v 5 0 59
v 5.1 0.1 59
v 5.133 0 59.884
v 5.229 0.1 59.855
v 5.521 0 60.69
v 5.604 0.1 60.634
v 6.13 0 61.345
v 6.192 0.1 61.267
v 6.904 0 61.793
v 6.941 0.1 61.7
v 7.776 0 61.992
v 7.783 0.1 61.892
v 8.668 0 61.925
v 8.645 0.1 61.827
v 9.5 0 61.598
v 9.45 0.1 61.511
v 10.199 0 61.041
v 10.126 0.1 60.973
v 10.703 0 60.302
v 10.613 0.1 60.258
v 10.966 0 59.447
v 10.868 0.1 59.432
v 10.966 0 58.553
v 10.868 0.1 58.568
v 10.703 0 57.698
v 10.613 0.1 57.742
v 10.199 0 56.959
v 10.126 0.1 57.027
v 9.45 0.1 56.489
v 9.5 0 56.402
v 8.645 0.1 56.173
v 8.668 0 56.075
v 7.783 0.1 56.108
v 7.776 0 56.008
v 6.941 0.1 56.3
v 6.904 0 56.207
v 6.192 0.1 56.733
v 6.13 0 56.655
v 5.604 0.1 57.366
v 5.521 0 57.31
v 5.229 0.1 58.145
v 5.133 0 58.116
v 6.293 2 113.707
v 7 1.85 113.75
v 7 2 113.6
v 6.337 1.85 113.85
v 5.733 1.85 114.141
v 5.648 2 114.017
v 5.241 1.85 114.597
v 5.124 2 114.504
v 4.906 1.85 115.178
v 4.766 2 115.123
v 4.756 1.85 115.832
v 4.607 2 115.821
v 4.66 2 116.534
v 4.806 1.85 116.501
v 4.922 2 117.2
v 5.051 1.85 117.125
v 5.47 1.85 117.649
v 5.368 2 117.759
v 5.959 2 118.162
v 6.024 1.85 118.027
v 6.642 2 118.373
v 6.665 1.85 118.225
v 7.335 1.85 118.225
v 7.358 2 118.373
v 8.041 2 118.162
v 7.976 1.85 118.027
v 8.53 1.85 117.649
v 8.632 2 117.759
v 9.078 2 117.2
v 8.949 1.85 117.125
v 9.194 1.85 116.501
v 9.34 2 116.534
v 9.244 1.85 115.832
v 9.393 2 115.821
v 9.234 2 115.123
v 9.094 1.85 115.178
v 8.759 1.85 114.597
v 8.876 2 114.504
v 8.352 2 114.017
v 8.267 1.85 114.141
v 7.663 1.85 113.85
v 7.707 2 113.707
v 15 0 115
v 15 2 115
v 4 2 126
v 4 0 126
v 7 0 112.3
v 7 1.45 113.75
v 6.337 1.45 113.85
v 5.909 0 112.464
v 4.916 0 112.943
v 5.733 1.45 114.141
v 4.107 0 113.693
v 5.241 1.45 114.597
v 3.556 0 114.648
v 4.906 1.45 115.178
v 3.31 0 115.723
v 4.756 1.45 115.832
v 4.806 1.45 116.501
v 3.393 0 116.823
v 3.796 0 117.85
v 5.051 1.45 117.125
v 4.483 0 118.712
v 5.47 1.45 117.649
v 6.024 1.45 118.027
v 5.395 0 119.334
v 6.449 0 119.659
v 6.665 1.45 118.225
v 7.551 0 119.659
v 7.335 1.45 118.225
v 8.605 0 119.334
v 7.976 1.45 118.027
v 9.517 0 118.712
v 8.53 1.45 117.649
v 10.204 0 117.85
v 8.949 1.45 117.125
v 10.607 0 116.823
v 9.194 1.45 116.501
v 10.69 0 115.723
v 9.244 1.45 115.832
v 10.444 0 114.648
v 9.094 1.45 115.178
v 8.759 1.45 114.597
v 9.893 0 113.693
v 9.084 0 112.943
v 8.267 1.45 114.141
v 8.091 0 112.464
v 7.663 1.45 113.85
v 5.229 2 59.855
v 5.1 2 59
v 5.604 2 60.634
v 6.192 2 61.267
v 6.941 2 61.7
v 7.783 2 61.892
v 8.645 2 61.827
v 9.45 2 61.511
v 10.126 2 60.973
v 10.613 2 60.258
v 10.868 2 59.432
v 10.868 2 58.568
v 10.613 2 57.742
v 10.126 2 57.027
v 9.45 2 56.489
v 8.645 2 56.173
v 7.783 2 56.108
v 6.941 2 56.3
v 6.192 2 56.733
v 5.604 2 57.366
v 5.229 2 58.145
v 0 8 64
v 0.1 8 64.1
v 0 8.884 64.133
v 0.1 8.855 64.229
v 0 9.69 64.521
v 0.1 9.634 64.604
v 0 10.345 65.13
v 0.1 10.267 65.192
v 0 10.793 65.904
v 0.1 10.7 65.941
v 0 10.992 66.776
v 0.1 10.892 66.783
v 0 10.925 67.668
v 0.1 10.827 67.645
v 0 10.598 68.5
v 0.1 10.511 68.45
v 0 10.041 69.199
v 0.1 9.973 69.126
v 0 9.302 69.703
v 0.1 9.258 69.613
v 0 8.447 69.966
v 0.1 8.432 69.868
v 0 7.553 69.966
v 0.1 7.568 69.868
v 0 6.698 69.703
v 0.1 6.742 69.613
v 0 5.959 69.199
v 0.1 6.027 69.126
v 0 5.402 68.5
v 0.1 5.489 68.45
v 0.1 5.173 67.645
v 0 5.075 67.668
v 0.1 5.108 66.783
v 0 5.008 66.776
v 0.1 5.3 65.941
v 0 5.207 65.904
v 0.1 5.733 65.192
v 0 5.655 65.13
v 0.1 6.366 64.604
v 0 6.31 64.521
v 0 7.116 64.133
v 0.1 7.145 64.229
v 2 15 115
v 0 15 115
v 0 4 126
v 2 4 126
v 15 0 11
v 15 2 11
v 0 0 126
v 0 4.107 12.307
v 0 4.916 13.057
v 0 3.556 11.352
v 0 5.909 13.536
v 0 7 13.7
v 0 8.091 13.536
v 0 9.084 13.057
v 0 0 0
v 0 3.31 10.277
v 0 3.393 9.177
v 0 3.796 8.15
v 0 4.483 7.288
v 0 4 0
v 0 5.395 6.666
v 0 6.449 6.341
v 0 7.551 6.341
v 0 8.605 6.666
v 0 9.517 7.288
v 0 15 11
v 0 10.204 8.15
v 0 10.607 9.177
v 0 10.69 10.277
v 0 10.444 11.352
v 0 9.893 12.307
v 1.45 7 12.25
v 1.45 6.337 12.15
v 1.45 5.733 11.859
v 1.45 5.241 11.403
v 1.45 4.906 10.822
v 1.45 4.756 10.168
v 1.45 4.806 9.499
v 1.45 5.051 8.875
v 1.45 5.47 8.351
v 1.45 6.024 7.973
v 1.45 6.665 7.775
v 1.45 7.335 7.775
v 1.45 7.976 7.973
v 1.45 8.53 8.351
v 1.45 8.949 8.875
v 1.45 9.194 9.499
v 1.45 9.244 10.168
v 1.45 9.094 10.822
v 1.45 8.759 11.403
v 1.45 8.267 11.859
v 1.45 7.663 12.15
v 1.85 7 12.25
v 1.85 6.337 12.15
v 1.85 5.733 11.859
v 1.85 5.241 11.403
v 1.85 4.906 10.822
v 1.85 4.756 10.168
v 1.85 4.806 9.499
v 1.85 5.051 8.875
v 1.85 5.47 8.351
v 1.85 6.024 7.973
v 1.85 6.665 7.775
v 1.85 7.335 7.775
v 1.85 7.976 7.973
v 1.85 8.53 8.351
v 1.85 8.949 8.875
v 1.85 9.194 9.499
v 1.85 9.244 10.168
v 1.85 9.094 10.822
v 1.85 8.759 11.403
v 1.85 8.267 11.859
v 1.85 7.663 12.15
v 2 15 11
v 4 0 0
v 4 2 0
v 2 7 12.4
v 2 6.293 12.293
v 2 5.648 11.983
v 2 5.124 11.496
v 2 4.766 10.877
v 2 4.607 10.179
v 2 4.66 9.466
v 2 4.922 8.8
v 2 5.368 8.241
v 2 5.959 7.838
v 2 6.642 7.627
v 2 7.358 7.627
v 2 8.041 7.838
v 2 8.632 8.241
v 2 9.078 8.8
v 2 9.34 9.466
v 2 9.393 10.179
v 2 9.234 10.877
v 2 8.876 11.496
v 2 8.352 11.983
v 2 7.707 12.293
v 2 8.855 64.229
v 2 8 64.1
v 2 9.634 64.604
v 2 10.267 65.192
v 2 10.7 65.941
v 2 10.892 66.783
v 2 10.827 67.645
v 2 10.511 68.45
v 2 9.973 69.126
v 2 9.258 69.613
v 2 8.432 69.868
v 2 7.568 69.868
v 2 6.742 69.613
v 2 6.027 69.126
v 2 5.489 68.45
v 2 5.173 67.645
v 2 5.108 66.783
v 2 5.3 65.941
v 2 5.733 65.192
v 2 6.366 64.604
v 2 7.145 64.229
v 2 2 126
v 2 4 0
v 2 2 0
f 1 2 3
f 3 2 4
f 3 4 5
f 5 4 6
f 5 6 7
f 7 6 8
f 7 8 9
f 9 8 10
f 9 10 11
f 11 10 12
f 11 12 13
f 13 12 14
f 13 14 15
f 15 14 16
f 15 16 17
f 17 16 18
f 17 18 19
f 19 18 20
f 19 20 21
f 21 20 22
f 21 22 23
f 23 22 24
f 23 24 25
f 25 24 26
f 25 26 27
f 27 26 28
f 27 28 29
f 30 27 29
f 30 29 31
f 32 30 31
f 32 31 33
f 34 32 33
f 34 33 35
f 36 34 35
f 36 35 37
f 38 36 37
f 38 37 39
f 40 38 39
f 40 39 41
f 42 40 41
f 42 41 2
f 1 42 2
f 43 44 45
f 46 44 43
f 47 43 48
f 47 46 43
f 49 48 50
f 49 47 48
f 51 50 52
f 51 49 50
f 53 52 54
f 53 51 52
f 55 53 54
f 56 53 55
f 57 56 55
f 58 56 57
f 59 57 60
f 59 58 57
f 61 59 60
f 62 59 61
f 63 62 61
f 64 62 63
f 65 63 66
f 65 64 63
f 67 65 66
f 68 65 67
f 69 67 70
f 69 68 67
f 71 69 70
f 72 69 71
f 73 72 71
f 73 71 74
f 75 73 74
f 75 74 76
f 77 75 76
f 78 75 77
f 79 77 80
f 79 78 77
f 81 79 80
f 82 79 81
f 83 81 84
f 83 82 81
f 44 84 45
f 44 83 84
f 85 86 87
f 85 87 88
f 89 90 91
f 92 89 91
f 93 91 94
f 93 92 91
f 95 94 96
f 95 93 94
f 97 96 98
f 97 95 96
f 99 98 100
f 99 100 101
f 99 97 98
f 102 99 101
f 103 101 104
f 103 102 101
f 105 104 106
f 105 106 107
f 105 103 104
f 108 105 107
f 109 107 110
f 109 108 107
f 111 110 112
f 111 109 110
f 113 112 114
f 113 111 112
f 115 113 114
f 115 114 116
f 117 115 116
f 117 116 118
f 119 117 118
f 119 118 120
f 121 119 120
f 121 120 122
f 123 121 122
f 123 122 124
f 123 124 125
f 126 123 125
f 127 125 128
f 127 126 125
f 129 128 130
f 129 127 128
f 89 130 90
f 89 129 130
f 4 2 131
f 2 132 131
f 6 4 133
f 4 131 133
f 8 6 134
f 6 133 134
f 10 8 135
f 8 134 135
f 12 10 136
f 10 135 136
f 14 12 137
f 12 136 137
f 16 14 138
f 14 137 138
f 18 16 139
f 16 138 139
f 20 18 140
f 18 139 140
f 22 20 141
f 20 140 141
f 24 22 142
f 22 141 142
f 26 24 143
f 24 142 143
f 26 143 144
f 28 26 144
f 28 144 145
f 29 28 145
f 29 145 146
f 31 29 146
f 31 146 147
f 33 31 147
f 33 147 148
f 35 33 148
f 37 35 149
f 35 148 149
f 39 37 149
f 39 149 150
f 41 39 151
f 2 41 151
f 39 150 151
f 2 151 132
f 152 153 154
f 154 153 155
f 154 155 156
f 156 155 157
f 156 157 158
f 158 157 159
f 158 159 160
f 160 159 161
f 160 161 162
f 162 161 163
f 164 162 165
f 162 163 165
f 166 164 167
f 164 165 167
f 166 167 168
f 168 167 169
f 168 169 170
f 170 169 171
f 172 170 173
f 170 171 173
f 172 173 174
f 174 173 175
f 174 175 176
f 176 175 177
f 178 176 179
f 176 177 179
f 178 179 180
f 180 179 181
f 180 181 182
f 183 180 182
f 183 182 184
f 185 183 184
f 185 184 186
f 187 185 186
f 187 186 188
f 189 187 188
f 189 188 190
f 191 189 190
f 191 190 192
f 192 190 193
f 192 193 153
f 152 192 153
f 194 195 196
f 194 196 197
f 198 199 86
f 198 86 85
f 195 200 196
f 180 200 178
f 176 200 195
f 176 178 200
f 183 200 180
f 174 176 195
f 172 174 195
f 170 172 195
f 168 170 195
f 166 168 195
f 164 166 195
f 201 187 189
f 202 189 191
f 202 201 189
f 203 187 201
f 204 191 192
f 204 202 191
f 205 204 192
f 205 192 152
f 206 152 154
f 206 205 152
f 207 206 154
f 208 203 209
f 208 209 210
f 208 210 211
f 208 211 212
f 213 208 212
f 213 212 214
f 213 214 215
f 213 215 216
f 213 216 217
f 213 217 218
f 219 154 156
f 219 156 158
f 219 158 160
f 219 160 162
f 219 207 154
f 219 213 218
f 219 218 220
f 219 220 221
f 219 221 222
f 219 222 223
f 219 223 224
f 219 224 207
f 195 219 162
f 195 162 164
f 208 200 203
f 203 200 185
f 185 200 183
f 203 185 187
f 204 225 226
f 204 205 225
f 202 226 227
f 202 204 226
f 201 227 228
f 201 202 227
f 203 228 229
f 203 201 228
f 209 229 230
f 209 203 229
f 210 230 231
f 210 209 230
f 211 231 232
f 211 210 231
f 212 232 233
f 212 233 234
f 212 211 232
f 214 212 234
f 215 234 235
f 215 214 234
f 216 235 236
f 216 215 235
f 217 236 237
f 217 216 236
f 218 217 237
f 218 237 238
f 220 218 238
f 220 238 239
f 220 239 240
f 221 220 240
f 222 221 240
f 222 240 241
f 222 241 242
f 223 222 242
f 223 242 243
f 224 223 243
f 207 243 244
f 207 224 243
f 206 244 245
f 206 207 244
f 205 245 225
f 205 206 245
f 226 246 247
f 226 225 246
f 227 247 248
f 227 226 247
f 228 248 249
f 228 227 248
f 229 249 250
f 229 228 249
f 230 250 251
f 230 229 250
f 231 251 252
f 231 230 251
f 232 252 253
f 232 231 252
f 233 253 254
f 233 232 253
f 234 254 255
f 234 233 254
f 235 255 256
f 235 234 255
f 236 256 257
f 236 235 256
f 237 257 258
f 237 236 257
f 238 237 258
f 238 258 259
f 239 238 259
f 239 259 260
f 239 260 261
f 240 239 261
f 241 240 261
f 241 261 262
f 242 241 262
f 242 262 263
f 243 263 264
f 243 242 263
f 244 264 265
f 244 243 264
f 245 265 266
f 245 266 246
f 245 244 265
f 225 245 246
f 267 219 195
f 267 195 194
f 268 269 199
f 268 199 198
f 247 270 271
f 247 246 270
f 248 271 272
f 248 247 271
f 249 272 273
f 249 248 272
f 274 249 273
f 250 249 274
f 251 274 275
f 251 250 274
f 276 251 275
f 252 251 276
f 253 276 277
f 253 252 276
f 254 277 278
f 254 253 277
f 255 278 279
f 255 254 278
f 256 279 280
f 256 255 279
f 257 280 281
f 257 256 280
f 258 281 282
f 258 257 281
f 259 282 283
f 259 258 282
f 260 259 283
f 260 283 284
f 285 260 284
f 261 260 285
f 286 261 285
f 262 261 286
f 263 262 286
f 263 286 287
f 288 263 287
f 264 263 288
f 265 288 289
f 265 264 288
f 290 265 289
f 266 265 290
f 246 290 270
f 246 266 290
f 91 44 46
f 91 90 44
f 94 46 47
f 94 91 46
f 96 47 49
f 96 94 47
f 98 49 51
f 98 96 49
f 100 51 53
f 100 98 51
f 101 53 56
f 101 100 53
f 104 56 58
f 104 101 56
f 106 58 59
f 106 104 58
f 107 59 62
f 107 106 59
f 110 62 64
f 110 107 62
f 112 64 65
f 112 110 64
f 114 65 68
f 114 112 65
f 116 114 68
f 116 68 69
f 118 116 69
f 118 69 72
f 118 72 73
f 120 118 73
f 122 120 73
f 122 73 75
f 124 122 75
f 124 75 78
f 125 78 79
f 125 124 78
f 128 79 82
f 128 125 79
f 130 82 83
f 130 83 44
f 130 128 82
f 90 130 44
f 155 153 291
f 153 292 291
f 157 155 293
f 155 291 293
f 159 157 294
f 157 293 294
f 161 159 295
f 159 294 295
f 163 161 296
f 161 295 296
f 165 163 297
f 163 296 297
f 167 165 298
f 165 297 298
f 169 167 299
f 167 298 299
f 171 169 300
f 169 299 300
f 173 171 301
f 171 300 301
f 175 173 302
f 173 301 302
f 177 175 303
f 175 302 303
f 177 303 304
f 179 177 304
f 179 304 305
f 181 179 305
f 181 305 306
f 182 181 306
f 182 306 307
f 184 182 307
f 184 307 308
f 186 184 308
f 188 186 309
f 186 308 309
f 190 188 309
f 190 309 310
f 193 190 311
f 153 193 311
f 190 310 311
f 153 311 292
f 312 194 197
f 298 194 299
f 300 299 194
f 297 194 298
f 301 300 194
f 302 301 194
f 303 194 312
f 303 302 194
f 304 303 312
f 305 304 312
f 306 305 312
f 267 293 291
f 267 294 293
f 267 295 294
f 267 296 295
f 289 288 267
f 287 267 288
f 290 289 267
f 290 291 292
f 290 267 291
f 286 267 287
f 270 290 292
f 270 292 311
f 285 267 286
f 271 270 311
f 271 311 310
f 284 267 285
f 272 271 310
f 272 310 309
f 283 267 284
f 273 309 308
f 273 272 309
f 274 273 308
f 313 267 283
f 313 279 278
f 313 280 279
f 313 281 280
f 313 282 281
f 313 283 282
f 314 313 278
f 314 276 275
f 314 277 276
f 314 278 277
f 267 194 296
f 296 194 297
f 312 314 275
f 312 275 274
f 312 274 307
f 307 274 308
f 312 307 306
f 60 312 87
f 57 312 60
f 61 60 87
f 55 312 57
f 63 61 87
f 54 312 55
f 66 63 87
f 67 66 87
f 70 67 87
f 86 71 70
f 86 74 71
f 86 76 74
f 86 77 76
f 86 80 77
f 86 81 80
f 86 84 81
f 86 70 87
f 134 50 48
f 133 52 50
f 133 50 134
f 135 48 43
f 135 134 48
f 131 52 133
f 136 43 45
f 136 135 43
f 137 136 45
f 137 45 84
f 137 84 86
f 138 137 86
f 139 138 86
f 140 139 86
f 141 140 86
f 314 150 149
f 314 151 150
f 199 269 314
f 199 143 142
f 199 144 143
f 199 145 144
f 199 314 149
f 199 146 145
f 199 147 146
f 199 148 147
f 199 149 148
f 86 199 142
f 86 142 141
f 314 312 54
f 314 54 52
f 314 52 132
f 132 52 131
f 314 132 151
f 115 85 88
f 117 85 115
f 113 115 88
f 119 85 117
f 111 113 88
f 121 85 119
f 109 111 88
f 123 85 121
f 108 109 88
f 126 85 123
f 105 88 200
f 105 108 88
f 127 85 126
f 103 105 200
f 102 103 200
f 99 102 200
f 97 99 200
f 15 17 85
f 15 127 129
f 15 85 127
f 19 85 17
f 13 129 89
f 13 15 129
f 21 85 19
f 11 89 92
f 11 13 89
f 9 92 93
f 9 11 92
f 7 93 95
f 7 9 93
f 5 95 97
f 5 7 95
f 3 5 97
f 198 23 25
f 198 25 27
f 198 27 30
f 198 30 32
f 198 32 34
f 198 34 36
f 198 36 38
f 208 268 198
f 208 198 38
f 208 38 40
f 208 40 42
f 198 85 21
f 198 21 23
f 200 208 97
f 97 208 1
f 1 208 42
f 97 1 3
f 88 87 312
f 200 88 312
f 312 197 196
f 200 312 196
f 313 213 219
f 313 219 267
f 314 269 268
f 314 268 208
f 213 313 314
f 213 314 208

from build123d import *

# Parameters (mm, degrees)
EXTRUDE_1_DEPTH             = 126
CHAMFER_1_SIZE              = 11
HOLE_WIZARD_M51_D           = 5.8
HOLE_WIZARD_M51_DEPTH       = 3
HOLE_WIZARD_M51_CSINK_D     = 6
HOLE_WIZARD_M51_CSINK_ANGLE = 90
HOLE_WIZARD_M51_TIP         = 1.742495795
HOLE_WIZARD_M52_D           = 5.8
HOLE_WIZARD_M52_DEPTH       = 3
HOLE_WIZARD_M52_CSINK_D     = 6
HOLE_WIZARD_M52_CSINK_ANGLE = 90
HOLE_WIZARD_M52_TIP         = 1.742495795


with BuildPart() as part:
    # Эскиз1 → Бобышка-Вытянуть1 (new body)
    with BuildSketch(Plane.XY):
        Polygon((0, 0), (0, 15), (2, 15), (2, 2), (15, 2), (15, 0), align=None)
    extrude(amount=EXTRUDE_1_DEPTH)

    # Фаска1
    chamfer_1_edges = [part.edges().sort_by_distance(p)[0] for p in [
        (1, 15, 126),
        (1, 15, 0),
        (15, 1, 126),
        (15, 1, 0),
    ]]
    chamfer(chamfer_1_edges, length=CHAMFER_1_SIZE)

    # Эскиз2 → Зенковка для винта с потайной головкой M41 (revolve, cut)
    with BuildSketch(Plane(origin=(7, 0, 116), x_dir=(0, 0, -1), z_dir=(1, 0, 0))):
        Polygon((0, 0), (0, 2), (2.4, 2), (2.25, 1.85), (2.25, 1.45), (3.7, 0), align=None)
    revolve(axis=Axis((7, -6.35, 116), (0, 1, 0)), mode=Mode.SUBTRACT)

    # Эскиз4 → Зенковка для винта с потайной головкой M42 (revolve, cut)
    with BuildSketch(Plane(origin=(0, 7, 10), x_dir=(0, 0, 1), z_dir=(0, 1, 0))):
        Polygon((0, 0), (0, 2), (2.4, 2), (2.25, 1.85), (2.25, 1.45), (3.7, 0), align=None)
    revolve(axis=Axis((-6.35, 7, 10), (1, 0, 0)), mode=Mode.SUBTRACT)

    # Отверстие с зазором M51
    with Locations(Plane.XZ):
        with Locations((8, 59)):
            CounterSinkHole(HOLE_WIZARD_M51_D / 2, HOLE_WIZARD_M51_CSINK_D / 2, depth=HOLE_WIZARD_M51_DEPTH, counter_sink_angle=HOLE_WIZARD_M51_CSINK_ANGLE)
            with Locations((0, 0, -(HOLE_WIZARD_M51_DEPTH + HOLE_WIZARD_M51_TIP / 2))):  # 118° drill point
                Cone(0, HOLE_WIZARD_M51_D / 2, HOLE_WIZARD_M51_TIP, mode=Mode.SUBTRACT)

    # Отверстие с зазором M52
    with Locations(Plane.ZY):
        with Locations((67, 8)):
            CounterSinkHole(HOLE_WIZARD_M52_D / 2, HOLE_WIZARD_M52_CSINK_D / 2, depth=HOLE_WIZARD_M52_DEPTH, counter_sink_angle=HOLE_WIZARD_M52_CSINK_ANGLE)
            with Locations((0, 0, -(HOLE_WIZARD_M52_DEPTH + HOLE_WIZARD_M52_TIP / 2))):  # 118° drill point
                Cone(0, HOLE_WIZARD_M52_D / 2, HOLE_WIZARD_M52_TIP, mode=Mode.SUBTRACT)


solid = part.part
